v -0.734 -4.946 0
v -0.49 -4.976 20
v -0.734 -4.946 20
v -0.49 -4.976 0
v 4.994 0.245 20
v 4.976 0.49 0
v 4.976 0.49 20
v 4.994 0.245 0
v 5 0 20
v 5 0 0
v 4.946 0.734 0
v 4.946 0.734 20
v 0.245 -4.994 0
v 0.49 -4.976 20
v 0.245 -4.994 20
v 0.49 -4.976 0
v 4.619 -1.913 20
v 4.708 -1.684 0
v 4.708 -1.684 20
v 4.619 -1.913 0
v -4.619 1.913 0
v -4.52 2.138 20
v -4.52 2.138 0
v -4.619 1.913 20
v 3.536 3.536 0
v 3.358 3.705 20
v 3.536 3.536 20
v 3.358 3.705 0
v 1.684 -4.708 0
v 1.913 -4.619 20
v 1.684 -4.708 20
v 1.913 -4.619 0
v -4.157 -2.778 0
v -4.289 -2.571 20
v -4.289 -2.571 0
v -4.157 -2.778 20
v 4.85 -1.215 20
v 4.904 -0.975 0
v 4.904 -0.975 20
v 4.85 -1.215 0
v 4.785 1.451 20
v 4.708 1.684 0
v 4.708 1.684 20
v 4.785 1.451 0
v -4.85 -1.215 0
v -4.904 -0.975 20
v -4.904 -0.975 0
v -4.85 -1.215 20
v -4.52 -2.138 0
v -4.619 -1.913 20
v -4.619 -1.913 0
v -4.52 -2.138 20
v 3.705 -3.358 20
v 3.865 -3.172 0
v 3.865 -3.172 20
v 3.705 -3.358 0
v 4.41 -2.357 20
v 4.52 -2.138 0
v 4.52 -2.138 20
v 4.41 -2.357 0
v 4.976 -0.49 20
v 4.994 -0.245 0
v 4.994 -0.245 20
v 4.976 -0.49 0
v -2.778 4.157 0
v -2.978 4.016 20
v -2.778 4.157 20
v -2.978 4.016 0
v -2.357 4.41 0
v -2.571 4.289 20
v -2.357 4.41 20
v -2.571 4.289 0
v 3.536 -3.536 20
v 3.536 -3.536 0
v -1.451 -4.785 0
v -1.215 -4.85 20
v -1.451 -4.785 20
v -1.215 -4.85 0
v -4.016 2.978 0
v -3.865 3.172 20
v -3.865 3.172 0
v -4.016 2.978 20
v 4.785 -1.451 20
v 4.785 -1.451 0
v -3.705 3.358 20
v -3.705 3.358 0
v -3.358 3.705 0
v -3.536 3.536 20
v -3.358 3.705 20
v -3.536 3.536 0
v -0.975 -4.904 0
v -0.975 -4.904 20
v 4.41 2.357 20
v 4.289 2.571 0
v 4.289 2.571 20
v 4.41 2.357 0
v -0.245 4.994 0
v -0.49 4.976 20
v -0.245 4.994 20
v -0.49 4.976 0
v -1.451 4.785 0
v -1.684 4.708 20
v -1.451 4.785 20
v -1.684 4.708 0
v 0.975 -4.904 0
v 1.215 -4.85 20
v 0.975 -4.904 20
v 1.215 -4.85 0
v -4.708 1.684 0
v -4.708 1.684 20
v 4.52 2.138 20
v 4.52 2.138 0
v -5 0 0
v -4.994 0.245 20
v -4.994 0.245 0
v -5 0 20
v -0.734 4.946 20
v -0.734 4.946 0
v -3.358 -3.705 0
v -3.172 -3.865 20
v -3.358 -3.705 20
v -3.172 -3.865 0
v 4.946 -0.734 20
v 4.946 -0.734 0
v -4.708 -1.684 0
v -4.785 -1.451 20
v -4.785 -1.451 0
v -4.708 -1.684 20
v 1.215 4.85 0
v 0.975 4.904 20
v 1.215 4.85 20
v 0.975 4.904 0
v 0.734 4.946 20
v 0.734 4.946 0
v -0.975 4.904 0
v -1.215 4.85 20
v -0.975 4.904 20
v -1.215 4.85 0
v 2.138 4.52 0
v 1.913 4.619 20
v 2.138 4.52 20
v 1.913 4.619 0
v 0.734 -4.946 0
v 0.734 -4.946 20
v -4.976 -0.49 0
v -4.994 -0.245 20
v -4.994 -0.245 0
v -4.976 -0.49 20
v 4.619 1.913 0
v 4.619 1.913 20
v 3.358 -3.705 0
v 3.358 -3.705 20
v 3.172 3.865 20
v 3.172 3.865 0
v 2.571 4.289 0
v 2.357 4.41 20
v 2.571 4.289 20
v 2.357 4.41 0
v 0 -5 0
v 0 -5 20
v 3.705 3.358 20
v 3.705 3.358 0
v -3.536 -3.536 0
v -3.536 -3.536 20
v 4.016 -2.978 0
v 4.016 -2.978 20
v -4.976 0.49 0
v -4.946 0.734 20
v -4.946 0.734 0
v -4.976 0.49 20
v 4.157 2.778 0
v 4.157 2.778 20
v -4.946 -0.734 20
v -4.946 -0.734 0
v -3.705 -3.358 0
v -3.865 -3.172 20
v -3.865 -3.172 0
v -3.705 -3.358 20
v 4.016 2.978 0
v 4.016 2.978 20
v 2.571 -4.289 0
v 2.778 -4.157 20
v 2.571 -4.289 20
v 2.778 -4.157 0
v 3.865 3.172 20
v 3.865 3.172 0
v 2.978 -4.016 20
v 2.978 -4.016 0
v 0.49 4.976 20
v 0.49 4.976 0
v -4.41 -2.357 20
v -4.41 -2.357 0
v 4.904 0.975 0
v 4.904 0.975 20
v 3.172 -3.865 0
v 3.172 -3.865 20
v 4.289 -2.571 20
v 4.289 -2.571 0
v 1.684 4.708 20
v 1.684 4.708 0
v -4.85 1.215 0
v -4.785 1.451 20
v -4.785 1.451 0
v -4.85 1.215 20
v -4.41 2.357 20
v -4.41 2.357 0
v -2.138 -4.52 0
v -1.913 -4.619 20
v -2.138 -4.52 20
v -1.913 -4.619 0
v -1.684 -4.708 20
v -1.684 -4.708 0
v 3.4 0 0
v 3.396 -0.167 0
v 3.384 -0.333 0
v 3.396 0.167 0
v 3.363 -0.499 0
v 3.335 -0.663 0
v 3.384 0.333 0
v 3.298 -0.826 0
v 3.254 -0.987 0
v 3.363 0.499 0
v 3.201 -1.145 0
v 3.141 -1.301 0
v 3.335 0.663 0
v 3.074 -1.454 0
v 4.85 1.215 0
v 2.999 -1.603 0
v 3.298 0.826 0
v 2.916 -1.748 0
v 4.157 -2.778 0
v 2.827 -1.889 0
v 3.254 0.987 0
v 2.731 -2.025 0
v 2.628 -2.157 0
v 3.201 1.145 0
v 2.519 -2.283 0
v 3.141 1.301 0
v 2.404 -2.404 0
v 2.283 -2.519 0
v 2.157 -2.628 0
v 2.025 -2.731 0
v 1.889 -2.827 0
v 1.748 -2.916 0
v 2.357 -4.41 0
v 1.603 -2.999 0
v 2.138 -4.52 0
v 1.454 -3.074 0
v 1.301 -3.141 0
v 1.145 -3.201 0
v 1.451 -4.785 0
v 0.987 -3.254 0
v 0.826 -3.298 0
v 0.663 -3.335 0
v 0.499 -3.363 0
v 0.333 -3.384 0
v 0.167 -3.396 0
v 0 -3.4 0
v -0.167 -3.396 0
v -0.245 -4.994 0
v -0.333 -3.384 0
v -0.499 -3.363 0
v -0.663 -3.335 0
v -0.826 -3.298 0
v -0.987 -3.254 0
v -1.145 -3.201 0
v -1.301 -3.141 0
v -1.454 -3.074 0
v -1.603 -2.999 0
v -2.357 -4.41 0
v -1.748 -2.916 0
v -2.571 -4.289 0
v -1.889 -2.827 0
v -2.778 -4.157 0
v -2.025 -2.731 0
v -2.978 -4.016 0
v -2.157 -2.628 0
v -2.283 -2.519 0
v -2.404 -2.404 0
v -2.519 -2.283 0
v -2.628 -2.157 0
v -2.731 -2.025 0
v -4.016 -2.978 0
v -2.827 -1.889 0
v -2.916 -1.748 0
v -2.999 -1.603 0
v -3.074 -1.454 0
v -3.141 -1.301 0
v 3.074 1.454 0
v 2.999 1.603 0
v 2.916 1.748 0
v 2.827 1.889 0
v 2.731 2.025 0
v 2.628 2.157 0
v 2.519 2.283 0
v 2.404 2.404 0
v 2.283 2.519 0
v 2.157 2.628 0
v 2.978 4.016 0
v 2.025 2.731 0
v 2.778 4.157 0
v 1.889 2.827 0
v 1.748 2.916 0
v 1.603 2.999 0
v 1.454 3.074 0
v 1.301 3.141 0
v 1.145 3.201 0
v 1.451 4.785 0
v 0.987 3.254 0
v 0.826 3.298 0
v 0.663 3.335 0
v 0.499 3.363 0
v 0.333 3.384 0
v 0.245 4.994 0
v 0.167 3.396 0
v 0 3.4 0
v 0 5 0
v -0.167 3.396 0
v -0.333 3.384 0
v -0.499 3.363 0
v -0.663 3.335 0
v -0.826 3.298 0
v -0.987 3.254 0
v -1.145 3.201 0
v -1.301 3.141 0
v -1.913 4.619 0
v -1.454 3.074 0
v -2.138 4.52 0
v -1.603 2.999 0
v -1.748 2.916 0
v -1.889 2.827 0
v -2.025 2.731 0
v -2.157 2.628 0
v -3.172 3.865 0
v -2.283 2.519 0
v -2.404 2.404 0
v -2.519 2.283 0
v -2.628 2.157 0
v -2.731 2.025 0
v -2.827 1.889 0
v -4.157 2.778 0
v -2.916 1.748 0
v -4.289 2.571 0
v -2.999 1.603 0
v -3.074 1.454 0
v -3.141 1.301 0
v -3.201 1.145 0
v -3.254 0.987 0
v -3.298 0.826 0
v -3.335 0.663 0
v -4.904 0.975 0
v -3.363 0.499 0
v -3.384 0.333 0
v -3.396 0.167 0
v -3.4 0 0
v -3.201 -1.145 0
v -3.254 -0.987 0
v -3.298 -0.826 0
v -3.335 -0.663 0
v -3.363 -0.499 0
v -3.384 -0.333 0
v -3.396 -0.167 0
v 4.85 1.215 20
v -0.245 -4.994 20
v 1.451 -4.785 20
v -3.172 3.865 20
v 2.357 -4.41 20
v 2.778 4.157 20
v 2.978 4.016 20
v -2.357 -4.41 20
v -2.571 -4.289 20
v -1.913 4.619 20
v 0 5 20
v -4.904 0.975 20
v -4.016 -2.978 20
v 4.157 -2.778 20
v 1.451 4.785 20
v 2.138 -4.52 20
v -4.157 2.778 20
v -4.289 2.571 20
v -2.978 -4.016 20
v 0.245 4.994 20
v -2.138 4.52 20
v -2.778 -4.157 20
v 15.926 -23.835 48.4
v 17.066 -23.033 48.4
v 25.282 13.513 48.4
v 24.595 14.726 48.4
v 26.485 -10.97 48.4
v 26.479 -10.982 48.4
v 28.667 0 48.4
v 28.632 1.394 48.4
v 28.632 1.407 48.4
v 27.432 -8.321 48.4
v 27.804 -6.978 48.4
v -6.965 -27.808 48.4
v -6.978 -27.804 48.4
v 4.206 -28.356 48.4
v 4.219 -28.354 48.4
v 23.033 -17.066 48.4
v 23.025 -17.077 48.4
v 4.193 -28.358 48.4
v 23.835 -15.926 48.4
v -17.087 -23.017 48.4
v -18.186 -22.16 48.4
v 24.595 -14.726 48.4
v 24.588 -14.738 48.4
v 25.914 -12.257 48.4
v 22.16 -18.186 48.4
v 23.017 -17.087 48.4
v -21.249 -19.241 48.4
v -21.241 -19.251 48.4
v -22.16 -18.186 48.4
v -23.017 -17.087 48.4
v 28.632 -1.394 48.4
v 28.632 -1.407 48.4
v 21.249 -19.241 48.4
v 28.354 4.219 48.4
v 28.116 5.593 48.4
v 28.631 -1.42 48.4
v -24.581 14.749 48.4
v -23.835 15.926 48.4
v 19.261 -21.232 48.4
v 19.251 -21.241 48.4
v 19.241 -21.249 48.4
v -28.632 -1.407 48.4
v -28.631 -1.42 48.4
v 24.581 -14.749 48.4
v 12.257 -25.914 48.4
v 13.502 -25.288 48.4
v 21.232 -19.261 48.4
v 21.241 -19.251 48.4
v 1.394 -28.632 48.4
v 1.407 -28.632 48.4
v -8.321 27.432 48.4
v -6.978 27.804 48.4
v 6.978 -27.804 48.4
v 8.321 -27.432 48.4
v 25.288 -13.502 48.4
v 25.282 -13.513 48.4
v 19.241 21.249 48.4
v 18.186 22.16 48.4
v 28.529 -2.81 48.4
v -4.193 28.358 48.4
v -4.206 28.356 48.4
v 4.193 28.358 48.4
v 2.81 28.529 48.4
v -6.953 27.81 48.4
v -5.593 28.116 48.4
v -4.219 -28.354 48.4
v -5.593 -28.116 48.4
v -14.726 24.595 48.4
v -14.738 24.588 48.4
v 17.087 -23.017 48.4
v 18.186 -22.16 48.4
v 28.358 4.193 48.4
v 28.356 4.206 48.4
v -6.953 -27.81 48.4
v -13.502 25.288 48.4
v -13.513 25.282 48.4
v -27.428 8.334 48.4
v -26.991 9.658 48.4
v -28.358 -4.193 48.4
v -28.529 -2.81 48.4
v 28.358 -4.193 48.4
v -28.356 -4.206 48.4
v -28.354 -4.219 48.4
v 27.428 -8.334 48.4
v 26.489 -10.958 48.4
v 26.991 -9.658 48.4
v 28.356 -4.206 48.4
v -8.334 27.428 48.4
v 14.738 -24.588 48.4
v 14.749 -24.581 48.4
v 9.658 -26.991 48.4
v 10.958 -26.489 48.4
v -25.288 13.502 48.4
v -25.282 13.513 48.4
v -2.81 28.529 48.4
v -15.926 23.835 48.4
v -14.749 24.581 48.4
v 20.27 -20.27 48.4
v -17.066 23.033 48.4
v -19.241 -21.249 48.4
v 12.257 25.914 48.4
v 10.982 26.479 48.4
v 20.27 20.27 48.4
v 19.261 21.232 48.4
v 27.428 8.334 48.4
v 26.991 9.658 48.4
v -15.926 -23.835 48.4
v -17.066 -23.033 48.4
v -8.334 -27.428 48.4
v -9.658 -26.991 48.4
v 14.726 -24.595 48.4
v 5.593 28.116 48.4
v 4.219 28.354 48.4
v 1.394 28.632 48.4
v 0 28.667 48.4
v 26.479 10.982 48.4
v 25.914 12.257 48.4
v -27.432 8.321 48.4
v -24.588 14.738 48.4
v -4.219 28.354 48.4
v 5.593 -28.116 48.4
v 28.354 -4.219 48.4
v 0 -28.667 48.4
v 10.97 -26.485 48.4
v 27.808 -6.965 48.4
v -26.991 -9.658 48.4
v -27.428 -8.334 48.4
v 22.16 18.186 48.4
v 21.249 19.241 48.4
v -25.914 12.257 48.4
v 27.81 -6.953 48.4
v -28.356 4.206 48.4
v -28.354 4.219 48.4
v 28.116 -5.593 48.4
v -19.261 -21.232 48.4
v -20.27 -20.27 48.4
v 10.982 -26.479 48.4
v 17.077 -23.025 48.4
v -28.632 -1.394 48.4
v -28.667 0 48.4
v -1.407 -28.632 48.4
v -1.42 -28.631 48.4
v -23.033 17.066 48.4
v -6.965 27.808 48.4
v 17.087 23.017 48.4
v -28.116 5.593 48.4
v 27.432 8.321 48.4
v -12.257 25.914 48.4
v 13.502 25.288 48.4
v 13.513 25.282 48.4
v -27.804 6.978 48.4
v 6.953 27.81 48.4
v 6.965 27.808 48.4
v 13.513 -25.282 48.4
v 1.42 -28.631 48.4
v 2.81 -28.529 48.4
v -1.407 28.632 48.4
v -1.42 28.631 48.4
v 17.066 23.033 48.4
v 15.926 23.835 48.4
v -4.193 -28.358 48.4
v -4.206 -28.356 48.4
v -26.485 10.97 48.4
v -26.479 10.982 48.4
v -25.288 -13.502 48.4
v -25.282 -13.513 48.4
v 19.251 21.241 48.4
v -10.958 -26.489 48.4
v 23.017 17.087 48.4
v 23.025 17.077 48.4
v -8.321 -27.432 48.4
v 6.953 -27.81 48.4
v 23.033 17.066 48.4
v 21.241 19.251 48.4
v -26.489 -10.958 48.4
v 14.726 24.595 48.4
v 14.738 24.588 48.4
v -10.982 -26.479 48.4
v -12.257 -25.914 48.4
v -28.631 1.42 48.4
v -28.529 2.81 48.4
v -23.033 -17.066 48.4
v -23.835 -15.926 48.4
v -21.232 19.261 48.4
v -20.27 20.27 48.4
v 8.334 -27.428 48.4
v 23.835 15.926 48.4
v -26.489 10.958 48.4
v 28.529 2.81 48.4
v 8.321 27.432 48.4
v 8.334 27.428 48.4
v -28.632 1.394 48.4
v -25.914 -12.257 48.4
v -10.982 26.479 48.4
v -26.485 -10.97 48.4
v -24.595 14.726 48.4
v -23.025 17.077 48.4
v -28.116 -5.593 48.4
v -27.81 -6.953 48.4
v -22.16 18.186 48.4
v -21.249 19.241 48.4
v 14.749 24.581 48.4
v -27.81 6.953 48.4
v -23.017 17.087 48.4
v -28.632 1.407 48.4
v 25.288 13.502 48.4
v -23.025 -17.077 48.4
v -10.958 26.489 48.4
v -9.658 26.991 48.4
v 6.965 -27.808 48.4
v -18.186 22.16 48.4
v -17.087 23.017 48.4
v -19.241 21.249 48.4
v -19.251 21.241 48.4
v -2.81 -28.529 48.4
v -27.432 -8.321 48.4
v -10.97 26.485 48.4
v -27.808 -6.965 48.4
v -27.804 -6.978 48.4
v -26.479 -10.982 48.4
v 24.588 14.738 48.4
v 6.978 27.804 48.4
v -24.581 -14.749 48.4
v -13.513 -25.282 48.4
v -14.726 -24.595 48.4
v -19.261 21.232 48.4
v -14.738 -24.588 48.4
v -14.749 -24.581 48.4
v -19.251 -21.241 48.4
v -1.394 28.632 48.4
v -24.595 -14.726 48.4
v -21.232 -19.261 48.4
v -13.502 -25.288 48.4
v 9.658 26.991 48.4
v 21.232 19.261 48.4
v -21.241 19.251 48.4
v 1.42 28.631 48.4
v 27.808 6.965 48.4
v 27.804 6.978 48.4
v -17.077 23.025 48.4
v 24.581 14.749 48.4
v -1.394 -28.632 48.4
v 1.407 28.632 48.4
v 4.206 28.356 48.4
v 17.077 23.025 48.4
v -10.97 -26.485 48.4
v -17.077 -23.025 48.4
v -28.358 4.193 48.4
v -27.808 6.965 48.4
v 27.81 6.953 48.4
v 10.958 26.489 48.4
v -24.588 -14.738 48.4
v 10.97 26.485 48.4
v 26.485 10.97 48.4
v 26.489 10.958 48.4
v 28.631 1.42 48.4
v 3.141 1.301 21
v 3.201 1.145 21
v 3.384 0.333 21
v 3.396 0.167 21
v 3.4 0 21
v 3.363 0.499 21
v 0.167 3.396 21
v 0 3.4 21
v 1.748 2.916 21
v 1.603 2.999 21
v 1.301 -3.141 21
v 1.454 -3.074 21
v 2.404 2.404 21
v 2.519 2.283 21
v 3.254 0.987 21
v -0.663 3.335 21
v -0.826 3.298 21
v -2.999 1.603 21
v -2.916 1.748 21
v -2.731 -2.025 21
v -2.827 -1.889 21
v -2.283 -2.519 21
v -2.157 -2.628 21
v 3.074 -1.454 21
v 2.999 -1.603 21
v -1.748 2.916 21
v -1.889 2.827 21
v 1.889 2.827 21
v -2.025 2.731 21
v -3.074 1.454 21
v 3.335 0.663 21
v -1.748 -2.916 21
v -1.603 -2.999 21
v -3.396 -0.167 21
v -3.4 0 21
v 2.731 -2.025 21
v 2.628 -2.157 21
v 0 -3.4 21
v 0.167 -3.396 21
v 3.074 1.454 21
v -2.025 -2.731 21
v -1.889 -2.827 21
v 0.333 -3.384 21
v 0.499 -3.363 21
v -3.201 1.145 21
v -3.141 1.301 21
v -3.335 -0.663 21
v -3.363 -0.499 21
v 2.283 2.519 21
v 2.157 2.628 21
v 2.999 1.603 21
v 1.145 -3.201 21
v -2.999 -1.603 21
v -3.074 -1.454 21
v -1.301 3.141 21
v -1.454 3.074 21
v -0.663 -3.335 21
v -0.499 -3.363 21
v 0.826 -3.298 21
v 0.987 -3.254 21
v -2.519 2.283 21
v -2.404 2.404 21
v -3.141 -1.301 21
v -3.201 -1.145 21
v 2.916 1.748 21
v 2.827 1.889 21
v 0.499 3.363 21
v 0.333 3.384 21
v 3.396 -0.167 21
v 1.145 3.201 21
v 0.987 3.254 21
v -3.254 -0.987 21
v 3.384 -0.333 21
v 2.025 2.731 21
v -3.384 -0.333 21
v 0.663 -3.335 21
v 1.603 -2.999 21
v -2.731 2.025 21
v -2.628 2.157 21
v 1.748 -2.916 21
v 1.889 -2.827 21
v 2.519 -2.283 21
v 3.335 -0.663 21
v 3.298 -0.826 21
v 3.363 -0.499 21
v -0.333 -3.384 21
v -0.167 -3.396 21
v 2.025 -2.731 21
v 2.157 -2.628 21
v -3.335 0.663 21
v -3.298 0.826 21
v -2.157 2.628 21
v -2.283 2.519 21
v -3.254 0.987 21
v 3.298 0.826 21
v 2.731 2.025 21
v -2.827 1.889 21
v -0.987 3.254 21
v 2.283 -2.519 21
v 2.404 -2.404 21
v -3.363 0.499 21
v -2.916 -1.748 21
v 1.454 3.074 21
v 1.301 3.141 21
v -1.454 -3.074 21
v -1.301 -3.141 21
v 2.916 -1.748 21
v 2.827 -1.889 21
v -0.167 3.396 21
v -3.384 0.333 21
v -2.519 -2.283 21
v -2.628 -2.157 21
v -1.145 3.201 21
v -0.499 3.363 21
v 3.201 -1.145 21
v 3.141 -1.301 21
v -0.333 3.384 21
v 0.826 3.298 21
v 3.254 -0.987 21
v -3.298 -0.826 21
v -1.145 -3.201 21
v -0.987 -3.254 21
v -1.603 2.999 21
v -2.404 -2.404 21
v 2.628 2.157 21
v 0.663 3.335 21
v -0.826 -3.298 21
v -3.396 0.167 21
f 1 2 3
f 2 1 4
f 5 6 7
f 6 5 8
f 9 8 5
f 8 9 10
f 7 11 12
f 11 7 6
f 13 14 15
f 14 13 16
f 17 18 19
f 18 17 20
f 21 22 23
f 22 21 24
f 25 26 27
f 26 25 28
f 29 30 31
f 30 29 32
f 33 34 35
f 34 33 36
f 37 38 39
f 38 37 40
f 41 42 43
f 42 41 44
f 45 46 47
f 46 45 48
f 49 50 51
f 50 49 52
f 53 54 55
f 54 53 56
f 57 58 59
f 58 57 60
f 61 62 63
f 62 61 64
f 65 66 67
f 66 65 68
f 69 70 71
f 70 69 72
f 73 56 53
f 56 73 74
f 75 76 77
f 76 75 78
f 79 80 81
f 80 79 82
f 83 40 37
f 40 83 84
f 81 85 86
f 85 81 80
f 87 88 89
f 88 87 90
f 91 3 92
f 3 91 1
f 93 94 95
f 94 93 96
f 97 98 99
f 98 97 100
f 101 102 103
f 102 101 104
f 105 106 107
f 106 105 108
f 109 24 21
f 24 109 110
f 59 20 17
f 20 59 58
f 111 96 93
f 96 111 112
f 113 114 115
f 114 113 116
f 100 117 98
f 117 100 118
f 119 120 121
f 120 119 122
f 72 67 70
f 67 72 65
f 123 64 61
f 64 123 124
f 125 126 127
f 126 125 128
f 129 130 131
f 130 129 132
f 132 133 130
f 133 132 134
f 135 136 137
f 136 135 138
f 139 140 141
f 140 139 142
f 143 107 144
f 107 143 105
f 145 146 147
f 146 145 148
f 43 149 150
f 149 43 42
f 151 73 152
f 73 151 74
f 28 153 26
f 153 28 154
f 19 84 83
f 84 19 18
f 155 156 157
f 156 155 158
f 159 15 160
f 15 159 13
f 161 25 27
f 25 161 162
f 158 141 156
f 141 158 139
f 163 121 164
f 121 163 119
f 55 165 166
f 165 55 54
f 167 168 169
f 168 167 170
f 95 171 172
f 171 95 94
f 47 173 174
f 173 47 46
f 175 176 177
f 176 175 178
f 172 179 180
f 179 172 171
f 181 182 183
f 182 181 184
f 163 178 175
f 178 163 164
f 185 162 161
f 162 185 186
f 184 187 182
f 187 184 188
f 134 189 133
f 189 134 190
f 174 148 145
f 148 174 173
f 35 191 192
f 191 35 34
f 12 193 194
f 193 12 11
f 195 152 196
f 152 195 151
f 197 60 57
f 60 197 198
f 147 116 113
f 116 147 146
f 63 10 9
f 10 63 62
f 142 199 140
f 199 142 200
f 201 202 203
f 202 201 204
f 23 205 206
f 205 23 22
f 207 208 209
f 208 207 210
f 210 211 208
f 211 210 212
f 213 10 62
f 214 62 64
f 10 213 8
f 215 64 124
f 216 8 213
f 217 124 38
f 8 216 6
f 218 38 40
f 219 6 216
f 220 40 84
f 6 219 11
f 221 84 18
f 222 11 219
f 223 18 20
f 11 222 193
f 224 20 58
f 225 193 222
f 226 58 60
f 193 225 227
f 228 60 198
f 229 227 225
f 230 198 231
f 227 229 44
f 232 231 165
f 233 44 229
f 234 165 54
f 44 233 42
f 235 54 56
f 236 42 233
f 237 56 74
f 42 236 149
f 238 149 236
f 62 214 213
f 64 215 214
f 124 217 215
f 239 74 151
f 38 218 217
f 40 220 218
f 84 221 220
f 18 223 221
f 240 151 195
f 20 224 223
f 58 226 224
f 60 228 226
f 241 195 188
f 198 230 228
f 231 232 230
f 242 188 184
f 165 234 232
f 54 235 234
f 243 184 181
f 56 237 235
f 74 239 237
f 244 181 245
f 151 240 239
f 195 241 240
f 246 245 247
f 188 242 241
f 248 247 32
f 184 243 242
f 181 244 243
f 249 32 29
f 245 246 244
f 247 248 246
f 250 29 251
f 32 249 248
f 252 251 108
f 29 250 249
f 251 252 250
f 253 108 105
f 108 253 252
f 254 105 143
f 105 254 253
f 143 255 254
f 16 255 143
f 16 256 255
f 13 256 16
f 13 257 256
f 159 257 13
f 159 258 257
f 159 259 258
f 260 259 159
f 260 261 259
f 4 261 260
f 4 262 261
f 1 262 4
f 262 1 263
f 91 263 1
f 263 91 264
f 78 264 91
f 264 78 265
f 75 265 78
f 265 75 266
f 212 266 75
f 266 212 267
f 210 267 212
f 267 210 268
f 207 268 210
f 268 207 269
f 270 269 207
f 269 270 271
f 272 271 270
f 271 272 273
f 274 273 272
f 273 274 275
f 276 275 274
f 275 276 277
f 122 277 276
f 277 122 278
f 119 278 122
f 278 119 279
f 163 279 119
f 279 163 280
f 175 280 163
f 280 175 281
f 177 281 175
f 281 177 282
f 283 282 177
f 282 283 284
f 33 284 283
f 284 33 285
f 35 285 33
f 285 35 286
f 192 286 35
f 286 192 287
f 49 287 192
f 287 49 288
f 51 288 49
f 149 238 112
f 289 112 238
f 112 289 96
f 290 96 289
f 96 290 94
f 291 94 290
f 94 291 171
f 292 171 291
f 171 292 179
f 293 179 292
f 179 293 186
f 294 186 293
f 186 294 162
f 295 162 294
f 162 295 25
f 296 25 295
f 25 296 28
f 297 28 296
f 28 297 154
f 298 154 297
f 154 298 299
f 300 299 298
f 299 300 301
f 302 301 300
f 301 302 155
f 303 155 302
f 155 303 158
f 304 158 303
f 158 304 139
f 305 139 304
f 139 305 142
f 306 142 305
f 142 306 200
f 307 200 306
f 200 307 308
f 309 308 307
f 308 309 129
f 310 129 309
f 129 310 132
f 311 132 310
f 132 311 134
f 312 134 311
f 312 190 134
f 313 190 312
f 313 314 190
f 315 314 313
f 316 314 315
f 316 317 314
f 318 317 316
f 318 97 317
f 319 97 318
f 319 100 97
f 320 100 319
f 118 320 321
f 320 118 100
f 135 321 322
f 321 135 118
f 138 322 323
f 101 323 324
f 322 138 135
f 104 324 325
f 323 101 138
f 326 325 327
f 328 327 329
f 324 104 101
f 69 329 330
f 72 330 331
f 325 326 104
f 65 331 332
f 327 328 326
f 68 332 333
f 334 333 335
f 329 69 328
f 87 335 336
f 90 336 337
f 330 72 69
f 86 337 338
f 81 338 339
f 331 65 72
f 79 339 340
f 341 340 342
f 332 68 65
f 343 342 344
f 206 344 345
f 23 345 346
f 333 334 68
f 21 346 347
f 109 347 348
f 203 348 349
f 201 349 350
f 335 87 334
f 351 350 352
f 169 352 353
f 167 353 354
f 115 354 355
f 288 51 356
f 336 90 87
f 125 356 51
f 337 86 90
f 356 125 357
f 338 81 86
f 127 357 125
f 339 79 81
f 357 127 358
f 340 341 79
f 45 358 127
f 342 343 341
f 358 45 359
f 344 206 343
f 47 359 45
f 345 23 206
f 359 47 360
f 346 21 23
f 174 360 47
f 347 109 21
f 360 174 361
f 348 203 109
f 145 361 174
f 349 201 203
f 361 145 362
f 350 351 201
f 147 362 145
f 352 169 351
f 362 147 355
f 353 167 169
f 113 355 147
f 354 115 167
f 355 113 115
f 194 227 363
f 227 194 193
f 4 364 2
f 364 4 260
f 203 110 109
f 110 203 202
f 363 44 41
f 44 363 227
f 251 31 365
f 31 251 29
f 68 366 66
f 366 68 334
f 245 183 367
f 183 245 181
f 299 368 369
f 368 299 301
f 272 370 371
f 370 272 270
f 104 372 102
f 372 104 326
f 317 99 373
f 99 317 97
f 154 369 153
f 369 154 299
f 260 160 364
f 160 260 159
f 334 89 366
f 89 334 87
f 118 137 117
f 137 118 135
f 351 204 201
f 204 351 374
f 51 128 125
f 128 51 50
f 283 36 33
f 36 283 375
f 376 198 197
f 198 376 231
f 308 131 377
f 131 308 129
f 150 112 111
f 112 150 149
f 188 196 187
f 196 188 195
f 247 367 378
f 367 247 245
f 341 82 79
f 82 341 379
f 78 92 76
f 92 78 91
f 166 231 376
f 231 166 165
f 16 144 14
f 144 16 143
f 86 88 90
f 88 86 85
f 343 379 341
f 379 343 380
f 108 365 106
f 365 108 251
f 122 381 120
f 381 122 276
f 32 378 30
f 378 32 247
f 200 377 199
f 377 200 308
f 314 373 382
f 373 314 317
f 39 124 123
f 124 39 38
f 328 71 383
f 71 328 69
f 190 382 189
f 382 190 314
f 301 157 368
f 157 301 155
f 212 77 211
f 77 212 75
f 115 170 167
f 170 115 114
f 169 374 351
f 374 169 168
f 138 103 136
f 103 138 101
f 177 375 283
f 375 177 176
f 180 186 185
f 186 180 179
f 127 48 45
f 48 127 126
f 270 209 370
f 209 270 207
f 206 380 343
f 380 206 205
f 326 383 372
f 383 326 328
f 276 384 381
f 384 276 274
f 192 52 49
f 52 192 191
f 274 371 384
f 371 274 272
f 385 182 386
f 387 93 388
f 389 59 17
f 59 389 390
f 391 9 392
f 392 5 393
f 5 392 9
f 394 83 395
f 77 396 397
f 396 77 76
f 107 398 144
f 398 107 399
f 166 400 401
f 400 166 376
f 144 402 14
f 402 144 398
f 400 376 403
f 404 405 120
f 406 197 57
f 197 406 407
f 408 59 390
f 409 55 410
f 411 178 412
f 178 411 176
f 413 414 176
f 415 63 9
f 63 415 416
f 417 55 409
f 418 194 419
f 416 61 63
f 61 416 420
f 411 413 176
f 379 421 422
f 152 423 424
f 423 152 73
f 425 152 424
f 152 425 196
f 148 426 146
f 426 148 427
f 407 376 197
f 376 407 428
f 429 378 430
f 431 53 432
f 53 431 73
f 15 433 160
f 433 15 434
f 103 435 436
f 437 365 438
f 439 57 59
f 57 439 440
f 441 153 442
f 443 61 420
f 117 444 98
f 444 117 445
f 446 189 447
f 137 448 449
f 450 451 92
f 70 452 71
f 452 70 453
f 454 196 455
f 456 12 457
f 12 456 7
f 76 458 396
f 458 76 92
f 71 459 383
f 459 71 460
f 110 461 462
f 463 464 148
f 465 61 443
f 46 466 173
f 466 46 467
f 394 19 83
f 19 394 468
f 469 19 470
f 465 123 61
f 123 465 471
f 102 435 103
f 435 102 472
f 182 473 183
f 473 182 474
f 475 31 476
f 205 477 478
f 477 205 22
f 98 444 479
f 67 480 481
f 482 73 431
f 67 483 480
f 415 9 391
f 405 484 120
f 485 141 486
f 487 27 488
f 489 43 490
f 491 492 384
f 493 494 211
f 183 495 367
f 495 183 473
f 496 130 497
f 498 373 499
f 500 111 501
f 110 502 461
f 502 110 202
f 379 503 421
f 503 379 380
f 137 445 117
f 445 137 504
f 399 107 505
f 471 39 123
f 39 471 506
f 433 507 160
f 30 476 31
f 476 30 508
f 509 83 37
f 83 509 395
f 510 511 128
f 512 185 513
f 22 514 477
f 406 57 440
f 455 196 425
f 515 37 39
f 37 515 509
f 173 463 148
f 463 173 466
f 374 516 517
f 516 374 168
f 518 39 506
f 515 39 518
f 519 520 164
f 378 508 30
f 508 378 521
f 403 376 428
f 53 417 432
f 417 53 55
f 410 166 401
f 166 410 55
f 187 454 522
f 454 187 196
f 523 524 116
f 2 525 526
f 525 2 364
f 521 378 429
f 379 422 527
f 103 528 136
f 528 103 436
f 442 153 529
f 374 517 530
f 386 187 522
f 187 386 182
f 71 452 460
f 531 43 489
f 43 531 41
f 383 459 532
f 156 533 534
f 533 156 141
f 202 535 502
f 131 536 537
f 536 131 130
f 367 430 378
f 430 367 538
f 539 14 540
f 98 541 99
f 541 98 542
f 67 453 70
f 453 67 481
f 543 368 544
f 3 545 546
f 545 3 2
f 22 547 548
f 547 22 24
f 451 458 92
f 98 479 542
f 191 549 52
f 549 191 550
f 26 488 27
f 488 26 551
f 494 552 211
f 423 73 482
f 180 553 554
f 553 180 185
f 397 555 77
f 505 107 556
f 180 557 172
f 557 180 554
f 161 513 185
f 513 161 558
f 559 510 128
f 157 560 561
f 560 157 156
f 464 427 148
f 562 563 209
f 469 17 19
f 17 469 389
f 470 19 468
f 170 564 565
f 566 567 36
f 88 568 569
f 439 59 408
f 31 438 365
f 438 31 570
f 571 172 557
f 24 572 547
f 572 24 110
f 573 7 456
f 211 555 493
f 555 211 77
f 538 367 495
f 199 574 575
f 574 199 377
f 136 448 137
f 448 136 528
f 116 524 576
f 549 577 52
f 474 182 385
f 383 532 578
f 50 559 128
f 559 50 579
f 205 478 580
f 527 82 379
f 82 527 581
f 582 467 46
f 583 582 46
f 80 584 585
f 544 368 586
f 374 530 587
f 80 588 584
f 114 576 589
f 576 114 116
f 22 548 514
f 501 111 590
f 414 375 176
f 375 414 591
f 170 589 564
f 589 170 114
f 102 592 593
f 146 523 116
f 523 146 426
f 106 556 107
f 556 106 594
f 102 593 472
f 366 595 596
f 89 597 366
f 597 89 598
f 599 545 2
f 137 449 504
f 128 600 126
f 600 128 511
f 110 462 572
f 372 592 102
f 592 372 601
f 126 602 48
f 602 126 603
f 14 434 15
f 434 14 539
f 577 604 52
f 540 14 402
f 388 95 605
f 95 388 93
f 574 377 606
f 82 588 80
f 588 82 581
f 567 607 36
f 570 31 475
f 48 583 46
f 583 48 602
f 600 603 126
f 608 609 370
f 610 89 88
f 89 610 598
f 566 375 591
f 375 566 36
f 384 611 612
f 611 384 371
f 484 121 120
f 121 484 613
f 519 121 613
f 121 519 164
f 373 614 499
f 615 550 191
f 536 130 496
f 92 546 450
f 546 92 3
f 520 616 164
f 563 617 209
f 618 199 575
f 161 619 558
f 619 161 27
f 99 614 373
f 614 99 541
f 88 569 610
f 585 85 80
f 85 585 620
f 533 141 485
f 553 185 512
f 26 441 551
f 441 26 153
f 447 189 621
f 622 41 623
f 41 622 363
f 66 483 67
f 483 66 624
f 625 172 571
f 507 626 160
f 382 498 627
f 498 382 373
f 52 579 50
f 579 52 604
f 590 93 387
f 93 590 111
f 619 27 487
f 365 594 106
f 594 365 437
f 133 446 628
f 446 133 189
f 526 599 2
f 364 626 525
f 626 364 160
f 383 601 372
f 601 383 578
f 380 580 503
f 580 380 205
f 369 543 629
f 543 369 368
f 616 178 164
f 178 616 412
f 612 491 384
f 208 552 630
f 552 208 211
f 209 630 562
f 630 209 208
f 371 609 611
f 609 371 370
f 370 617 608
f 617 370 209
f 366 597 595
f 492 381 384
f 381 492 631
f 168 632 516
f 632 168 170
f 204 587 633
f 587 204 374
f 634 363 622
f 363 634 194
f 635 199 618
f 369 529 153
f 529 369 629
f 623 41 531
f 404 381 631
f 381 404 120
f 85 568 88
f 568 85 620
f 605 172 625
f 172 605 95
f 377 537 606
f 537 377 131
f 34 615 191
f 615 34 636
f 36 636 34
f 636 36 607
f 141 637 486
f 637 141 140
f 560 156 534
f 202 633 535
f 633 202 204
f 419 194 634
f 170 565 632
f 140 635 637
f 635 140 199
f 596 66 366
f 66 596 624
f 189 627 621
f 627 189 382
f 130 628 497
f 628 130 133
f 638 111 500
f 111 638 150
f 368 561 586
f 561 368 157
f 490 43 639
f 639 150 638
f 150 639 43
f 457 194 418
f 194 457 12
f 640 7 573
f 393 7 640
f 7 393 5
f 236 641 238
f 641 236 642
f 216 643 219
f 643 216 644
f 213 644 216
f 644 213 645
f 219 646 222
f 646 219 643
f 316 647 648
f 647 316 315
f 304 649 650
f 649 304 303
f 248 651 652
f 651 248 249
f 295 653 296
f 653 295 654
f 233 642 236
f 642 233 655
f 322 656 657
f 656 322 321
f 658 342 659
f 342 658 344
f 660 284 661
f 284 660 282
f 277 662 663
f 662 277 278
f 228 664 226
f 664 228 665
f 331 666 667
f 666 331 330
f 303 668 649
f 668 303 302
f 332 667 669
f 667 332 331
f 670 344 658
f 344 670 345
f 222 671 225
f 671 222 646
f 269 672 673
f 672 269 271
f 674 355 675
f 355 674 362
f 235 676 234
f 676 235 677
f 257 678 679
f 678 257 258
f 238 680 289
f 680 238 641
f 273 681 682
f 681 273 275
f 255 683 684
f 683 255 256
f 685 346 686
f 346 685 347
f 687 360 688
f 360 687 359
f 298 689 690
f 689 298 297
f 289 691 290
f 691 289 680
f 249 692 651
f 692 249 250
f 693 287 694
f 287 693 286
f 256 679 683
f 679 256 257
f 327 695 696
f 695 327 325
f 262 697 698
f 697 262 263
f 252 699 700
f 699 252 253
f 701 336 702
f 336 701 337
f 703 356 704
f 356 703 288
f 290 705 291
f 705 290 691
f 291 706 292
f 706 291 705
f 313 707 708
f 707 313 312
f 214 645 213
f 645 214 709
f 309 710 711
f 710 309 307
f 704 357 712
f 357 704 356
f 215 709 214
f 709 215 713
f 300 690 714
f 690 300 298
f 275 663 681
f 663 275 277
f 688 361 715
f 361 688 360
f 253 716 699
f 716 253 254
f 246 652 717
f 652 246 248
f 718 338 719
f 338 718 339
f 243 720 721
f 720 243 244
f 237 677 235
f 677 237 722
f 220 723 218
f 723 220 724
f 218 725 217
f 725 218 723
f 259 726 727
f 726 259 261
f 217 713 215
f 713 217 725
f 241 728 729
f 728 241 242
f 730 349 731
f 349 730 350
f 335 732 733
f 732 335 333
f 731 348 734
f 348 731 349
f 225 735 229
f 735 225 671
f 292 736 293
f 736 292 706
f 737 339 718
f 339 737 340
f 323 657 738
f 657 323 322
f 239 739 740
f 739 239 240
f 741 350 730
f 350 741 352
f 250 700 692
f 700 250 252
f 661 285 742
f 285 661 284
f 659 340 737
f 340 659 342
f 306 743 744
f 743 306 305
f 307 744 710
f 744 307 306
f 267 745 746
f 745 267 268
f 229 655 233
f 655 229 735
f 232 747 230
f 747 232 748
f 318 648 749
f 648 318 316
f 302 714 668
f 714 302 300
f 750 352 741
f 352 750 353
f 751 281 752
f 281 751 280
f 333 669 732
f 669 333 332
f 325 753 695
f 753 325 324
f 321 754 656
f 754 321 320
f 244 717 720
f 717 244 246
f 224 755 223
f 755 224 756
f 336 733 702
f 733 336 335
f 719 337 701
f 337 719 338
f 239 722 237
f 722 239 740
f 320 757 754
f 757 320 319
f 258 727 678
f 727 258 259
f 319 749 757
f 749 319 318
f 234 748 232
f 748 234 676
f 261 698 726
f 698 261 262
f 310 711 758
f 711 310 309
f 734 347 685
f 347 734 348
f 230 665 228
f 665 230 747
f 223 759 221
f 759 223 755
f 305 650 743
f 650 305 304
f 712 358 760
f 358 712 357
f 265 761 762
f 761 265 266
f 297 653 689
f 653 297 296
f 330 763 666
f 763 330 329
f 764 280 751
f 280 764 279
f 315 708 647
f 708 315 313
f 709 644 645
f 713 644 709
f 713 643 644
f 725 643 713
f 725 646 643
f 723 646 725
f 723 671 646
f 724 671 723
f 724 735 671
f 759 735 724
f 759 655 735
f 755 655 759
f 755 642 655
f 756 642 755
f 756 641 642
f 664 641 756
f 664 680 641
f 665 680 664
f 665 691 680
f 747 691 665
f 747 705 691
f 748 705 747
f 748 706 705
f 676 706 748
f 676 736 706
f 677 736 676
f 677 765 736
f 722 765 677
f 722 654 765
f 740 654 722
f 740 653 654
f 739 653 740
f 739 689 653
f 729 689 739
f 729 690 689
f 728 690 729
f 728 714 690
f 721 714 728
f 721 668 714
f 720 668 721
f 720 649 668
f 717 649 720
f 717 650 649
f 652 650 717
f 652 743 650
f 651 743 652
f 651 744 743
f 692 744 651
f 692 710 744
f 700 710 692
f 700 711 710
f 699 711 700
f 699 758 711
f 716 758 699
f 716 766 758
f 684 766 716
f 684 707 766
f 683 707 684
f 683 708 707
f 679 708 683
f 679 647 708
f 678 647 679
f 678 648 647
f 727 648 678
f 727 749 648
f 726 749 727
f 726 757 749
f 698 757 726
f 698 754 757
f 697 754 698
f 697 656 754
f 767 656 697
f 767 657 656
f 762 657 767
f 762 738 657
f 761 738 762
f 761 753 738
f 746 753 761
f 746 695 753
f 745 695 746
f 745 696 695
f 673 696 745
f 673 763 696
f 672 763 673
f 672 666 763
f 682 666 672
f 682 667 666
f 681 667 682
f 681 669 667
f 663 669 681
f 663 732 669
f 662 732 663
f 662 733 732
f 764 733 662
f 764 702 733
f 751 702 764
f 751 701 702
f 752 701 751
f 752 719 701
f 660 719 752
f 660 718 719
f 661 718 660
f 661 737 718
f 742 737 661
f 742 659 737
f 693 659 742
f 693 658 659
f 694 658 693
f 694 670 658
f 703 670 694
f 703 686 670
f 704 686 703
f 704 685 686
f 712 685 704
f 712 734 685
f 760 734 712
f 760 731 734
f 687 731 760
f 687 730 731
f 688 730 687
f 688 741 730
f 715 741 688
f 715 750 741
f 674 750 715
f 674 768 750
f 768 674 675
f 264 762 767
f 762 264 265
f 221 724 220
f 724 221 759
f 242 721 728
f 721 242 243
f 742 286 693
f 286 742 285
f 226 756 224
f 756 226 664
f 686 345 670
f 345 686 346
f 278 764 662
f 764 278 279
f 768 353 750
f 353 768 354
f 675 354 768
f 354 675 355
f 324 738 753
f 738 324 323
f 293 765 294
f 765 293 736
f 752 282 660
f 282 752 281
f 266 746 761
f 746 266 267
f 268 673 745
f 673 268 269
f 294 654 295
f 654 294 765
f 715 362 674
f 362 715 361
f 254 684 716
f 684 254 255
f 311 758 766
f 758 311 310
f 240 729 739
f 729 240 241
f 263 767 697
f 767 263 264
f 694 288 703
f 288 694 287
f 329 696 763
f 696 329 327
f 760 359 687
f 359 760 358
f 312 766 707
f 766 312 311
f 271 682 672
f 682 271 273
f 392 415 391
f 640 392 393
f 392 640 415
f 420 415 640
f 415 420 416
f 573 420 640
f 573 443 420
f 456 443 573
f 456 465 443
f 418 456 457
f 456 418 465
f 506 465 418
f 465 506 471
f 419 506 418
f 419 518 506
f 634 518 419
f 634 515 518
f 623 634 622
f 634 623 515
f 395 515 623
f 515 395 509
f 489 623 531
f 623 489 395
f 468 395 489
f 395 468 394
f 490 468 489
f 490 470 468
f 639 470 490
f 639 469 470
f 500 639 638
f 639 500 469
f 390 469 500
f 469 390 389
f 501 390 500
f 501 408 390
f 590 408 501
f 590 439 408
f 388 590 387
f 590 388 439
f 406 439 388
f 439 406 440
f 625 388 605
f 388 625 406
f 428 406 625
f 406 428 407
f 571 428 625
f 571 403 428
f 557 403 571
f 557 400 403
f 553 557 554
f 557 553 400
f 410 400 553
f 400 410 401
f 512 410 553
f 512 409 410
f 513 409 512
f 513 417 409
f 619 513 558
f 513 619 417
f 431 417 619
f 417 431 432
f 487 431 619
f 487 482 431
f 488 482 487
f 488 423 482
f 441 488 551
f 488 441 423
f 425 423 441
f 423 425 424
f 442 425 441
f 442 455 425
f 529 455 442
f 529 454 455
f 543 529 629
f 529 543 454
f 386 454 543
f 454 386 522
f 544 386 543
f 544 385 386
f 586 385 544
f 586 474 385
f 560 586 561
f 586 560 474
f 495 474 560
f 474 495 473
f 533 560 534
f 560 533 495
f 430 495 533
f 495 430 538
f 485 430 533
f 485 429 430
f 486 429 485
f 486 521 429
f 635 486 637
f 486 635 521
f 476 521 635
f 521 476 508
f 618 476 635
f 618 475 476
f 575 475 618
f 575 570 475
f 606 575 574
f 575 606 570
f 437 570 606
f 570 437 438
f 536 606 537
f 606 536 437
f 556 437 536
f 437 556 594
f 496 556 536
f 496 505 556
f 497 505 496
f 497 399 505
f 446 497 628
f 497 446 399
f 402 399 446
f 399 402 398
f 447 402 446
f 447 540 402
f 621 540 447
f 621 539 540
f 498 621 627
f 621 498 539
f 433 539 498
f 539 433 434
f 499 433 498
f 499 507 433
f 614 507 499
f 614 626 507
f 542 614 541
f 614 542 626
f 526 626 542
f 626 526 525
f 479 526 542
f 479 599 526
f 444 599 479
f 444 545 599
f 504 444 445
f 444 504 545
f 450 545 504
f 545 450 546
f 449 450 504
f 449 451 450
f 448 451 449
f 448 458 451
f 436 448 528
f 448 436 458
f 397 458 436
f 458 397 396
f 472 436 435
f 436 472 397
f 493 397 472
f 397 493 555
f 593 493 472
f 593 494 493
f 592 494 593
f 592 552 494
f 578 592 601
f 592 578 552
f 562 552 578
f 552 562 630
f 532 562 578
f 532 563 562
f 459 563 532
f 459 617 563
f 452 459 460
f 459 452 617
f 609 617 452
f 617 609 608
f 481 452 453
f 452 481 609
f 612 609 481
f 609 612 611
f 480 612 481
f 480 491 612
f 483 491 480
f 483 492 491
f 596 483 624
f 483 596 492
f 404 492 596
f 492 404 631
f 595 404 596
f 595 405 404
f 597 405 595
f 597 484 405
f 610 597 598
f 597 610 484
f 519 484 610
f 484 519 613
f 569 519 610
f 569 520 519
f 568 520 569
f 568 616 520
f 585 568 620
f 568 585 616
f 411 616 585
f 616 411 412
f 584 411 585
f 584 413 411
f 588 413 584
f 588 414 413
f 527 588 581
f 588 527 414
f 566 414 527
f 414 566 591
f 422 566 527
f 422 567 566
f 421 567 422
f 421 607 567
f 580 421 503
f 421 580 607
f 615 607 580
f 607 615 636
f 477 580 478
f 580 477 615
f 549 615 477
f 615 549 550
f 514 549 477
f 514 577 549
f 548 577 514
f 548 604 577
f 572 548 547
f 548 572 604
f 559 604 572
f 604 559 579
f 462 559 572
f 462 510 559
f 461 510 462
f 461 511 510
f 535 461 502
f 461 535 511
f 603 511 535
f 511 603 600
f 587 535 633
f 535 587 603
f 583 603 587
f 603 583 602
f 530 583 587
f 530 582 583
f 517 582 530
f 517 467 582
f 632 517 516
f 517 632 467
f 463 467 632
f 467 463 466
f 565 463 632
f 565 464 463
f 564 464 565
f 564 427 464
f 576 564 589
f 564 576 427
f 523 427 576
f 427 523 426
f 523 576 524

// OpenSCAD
// Small lab funnel, printed upright (wide opening at the top)
// Units: mm

// ---------------- Parameters ----------------
spout_od      = 10;    // outer diameter of the straight spout
spout_length  = 20;    // spout runs from z = 0 to z = 20

cone_bottom_d = 10;    // cone outer diameter at z = 20 (spout / cone overlap)
cone_top_d    = 60;    // rim outer diameter at z = 50
cone_top_z    = 50;    // height of the funnel rim

wall          = 1.6;   // wall thickness everywhere (spout bore = 6.8 mm)

$fn = 128;             // smoothness for curved surfaces

// ---------------- Derived ----------------
cone_h = cone_top_z - spout_length;   // cone height (29.04 mm)

// ---------------- Model ----------------
difference() {
    union() {
        // Straight spout: z = 0 .. 20
        cylinder(d = spout_od, h = spout_length);

        // Cone: z = 20 .. 50, widening from 10 mm to 60 mm
        translate([0, 0, spout_length])
            cylinder(d1 = cone_bottom_d, d2 = cone_top_d, h = cone_h);
    }

    // Hollow bore through the spout (extends past the bottom face)
    translate([0, 0, -1])
        cylinder(d = spout_od - 2 * wall, h = spout_length + 2);

    // Open top rim: cut above z = 48.44 so the funnel is open at the top
    translate([0, 0, cone_top_z - 1.6])
        cylinder(d1 = cone_top_d, d2 = cone_top_d + 2 * wall, h = 1.6);
}
